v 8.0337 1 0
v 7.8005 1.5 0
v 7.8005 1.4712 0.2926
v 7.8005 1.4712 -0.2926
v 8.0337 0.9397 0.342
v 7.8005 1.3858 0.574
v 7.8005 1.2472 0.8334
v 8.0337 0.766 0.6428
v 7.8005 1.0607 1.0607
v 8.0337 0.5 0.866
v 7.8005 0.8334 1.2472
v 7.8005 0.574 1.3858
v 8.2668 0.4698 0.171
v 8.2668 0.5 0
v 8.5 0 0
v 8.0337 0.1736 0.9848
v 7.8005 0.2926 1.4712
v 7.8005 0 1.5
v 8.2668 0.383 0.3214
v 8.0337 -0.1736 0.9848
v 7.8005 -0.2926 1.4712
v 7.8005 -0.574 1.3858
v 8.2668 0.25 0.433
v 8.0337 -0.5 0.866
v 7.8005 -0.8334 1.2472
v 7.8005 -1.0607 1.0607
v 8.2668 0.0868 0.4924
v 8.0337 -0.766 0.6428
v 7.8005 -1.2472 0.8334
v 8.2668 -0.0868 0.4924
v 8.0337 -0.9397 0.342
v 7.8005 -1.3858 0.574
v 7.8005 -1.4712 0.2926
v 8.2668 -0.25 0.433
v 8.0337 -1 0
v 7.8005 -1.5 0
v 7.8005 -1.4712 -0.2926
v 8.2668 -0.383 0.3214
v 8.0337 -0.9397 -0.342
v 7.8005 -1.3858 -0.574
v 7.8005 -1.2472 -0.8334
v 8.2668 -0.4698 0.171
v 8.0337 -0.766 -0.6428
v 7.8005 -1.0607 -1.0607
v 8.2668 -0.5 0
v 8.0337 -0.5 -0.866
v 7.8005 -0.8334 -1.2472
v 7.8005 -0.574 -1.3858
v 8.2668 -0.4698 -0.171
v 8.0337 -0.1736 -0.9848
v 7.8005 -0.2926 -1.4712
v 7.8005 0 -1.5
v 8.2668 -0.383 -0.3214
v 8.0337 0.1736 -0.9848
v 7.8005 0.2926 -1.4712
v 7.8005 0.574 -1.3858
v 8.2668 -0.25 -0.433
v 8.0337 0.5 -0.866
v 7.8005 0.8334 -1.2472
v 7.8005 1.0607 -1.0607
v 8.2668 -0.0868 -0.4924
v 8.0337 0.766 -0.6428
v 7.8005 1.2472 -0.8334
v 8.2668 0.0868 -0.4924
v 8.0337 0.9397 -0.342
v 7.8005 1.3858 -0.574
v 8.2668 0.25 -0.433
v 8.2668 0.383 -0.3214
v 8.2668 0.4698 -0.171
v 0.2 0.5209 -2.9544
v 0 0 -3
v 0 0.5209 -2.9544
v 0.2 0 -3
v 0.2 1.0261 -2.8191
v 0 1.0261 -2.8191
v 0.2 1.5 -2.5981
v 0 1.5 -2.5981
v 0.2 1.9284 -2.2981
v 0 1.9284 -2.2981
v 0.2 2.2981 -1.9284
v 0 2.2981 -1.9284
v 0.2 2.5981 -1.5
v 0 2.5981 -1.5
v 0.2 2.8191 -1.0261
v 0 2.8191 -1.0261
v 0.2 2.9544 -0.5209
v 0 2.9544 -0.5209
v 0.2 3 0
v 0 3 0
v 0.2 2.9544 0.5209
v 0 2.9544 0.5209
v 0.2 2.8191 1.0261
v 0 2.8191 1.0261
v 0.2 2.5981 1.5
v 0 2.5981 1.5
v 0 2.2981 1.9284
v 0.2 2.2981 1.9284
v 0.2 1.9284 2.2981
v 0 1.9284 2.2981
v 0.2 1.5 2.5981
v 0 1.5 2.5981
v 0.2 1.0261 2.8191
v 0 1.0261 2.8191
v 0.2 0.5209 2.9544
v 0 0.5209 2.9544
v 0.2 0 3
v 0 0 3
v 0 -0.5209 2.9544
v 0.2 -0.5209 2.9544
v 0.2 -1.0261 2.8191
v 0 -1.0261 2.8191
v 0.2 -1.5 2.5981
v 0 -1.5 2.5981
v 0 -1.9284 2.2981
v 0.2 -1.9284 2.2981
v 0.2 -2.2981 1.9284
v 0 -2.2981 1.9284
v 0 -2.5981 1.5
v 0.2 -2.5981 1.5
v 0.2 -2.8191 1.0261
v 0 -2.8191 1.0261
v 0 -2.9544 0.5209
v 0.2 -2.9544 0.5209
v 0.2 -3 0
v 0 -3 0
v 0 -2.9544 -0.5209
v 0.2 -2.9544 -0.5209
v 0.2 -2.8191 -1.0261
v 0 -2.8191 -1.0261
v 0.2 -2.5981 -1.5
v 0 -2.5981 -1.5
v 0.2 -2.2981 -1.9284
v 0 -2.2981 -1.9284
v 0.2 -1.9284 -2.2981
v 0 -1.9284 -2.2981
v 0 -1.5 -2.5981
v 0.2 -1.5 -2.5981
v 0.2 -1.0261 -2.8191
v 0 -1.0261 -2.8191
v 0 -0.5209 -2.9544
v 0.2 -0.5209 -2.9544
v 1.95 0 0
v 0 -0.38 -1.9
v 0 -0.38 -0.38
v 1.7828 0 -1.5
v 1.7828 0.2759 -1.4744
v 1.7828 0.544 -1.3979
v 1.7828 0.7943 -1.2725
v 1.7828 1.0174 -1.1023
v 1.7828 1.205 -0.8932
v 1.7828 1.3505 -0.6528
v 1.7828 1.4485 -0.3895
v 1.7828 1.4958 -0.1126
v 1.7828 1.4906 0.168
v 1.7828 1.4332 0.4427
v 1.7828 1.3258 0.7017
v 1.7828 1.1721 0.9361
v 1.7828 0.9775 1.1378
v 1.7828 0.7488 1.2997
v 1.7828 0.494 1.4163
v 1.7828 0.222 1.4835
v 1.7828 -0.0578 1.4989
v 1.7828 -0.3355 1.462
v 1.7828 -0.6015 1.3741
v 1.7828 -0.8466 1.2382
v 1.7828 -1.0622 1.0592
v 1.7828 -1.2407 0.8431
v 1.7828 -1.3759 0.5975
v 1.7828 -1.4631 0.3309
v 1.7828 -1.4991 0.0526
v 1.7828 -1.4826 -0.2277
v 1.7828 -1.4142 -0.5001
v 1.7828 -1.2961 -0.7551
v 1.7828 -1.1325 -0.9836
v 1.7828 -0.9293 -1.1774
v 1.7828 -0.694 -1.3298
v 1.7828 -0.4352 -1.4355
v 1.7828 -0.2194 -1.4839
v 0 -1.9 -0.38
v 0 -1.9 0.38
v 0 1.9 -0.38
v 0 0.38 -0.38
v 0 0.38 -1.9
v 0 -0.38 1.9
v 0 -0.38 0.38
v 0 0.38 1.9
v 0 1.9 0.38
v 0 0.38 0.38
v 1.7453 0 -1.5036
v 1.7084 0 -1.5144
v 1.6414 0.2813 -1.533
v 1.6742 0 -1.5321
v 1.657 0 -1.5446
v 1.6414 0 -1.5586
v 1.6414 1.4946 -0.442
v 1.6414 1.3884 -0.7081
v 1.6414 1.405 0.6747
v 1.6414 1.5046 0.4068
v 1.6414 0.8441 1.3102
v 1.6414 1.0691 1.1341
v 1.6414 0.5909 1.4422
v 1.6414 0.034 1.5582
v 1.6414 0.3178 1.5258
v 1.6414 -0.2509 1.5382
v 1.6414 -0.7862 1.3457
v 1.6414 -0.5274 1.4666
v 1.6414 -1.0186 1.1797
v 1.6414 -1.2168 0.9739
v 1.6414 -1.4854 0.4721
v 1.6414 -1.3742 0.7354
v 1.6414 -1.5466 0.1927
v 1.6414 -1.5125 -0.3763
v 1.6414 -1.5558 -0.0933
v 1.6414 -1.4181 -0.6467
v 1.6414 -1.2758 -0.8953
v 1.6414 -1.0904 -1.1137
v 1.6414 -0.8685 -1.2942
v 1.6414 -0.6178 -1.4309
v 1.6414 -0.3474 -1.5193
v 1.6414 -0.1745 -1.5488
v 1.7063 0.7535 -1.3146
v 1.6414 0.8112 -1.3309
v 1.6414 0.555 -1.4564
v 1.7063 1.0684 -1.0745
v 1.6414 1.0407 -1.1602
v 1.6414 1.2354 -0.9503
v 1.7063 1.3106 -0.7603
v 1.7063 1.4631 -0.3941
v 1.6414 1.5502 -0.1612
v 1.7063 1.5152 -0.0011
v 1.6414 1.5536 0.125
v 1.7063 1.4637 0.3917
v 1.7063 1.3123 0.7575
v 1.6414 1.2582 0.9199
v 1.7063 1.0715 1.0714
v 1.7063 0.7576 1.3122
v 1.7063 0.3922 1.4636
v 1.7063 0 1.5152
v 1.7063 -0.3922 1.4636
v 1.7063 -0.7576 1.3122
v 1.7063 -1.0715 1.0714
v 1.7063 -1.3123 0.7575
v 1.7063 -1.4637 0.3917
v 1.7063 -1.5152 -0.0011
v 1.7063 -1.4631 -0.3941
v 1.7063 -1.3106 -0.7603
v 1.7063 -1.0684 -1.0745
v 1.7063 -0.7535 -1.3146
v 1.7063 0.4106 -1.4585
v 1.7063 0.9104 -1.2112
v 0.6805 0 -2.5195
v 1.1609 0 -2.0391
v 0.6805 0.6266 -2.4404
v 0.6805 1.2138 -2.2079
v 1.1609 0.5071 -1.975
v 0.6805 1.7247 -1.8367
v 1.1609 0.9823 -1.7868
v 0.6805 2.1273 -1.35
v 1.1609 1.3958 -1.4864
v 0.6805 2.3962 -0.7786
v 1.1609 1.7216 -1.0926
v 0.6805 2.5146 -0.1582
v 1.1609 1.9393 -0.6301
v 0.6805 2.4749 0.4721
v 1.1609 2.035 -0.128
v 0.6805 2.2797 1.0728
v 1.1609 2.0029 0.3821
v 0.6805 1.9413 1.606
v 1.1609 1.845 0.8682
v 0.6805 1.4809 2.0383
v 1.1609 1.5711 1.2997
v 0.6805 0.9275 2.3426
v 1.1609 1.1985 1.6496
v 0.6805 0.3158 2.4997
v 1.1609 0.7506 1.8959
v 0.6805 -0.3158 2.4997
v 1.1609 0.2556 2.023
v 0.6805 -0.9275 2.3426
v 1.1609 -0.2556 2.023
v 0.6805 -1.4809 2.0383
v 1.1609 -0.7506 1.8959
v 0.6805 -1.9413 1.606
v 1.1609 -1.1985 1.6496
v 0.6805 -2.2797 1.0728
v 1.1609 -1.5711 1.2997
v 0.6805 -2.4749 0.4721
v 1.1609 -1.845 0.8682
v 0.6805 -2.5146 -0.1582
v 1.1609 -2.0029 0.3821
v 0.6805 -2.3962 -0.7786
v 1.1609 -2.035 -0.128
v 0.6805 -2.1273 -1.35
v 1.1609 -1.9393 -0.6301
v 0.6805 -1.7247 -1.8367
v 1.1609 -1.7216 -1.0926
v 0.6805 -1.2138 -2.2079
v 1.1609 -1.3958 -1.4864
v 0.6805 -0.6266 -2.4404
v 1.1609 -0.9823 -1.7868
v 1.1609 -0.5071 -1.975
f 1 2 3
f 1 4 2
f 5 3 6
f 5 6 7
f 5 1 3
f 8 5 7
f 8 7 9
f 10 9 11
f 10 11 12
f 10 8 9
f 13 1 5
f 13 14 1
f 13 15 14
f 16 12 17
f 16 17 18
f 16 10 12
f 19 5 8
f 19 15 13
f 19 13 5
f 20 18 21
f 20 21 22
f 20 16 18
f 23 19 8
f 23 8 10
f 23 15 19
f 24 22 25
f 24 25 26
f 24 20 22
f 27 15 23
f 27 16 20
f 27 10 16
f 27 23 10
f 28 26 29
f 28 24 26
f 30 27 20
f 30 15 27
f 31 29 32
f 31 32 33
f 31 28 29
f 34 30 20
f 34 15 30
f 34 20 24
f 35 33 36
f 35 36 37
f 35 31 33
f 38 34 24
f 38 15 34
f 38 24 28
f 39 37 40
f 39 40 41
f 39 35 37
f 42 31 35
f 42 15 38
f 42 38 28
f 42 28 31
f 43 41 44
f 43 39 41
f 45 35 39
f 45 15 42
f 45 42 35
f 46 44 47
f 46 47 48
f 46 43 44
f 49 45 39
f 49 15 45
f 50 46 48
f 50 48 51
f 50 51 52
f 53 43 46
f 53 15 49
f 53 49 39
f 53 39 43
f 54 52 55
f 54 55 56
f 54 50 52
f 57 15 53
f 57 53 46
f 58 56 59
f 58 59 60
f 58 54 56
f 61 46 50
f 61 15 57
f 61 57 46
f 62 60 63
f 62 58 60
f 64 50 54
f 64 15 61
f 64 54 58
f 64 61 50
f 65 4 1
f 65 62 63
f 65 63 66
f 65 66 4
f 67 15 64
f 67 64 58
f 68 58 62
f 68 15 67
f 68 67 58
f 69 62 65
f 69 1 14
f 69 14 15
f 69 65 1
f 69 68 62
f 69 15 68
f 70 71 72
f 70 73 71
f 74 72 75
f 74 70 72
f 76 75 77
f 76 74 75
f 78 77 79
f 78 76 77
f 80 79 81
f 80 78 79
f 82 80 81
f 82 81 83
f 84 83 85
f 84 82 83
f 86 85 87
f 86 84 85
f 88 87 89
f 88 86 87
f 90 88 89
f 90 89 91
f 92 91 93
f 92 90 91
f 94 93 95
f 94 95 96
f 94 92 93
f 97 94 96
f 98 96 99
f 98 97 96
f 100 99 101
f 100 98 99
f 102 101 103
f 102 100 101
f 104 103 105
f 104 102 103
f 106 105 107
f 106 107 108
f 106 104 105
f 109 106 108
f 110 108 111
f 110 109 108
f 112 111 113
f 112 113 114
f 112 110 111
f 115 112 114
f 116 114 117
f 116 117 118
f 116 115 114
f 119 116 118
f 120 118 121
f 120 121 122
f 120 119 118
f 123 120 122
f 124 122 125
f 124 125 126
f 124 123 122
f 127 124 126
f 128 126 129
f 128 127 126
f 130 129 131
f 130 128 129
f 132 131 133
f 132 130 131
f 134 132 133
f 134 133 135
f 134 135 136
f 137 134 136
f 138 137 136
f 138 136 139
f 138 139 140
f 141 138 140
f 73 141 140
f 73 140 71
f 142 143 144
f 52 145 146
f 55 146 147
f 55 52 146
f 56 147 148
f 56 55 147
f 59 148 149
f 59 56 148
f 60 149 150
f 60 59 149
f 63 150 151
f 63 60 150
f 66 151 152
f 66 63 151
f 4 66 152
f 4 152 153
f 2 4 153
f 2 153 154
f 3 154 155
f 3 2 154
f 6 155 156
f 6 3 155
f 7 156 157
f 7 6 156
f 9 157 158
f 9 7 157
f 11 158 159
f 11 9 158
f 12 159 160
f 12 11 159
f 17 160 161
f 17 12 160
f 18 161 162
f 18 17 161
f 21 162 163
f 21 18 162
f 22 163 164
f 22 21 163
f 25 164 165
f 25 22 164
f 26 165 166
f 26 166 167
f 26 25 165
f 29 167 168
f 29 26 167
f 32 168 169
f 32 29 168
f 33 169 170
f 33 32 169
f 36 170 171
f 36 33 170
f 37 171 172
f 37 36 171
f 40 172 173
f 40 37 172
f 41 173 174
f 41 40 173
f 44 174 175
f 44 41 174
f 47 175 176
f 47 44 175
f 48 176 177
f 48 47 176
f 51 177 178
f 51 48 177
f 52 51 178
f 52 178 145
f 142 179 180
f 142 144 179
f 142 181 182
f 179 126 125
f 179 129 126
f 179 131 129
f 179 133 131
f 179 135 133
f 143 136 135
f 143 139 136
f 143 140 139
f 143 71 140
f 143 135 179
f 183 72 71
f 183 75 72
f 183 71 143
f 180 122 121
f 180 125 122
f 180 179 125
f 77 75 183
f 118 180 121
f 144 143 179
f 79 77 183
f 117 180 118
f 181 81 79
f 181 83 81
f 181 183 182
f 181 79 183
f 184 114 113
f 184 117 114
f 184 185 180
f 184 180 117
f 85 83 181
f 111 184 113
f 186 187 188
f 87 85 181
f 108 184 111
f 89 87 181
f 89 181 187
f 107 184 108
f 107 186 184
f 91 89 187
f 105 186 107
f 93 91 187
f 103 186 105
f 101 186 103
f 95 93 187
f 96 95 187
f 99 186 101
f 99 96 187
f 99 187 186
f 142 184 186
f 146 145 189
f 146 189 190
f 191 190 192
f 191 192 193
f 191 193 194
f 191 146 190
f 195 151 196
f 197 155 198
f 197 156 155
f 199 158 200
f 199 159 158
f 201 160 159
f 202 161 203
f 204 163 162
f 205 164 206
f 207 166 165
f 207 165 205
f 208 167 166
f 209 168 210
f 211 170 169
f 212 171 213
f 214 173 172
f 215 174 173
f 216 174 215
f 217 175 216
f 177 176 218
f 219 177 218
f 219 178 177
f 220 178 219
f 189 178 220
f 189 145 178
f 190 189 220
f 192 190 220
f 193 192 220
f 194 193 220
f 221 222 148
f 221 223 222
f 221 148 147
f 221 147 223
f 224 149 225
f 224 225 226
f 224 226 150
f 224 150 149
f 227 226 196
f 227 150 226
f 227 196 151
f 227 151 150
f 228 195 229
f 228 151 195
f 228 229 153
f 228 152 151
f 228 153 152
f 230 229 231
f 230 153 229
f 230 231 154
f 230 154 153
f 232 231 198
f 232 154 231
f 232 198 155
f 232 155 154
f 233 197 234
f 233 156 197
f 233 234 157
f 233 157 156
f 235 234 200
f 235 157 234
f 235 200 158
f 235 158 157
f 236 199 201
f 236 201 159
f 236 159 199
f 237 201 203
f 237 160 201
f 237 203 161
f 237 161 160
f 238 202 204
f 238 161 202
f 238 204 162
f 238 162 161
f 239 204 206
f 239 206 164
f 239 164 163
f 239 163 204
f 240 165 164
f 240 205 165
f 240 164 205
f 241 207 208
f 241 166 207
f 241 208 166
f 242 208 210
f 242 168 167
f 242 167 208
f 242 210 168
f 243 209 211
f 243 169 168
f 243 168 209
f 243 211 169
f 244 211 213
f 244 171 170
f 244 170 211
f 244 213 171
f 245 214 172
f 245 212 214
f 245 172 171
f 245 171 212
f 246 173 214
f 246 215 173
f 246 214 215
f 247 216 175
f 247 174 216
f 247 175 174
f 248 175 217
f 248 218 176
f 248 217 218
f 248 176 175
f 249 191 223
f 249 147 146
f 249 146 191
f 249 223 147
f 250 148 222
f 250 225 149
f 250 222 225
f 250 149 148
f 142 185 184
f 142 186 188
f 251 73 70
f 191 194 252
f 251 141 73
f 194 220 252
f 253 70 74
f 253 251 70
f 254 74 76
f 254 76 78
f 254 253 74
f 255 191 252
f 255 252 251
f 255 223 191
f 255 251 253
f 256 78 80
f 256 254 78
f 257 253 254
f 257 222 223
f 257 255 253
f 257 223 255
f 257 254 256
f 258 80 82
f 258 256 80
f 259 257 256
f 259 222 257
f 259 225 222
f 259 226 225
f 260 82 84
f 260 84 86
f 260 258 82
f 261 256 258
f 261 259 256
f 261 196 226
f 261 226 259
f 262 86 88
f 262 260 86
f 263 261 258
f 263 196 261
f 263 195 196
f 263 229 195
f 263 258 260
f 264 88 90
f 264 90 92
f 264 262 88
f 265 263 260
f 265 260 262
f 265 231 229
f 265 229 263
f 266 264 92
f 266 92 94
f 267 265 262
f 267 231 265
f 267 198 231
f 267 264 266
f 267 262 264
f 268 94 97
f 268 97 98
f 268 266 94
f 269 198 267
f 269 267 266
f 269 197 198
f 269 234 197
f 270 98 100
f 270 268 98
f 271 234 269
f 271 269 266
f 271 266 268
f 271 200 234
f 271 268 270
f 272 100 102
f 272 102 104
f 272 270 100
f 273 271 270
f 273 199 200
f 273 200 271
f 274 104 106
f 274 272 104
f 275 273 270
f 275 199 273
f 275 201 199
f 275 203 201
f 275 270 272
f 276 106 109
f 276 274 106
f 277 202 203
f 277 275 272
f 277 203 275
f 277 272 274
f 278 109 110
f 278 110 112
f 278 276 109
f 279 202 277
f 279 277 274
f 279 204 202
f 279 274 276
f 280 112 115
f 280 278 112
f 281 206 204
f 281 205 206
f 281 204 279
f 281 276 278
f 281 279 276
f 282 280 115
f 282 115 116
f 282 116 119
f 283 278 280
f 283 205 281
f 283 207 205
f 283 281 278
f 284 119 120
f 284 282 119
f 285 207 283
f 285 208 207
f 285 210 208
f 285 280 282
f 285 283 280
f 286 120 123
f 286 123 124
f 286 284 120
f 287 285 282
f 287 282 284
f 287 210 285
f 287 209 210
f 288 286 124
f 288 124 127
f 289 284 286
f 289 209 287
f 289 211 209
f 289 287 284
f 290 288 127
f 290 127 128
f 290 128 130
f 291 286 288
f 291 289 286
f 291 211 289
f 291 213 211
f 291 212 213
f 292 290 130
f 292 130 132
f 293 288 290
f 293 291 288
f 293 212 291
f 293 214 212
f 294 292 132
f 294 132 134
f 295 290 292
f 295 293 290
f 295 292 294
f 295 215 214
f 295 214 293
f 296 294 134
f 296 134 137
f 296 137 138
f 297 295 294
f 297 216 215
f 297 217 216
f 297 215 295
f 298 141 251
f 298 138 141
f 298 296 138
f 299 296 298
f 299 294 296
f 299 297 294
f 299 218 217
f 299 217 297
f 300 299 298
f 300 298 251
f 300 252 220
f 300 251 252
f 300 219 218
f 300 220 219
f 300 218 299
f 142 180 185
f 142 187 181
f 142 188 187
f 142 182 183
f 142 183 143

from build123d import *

# Parameters (mm, degrees)
FILLET2_R = 0.2


with BuildPart() as part:
    # Sketch1 → Base (revolve)
    with BuildSketch(Plane(origin=(0, 0, 0), x_dir=(1, 0, 0), z_dir=(0, 1, 0))):
        Polygon((1.7, 1.5), (8.5, 1.5), (8.5, 0), (0, 0), (0, 3), (0.2, 3), align=None)
    revolve(axis=Axis((-6.506452013, 0, 0), (1, 0, 0)))

    # Sketch3 → Cut-Revolve1 (revolve, cut)
    with BuildSketch(Plane.XY):
        Polygon((8.65755877, 0), (8.65755877, 20), (-0.826153163, 20), (8.5, 0), align=None)
    revolve(axis=Axis((4.883468835, 0, 0), (1, 0, 0)), mode=Mode.SUBTRACT)

    # Fillet2
    fillet2_edges = [part.edges().sort_by_distance(p)[0] for p in [
        (1.7, 0, 1.5),
    ]]
    fillet(fillet2_edges, radius=FILLET2_R)

    # Sketch2 → Cut-Loft1 section 0
    with BuildSketch(Plane(origin=(0, -0.680816871, 0.306758275), x_dir=(0, 0, 1), z_dir=(-1, 0, 0)), mode=Mode.PRIVATE) as cut_loft1_s0:
        Polygon((-0.686758275, 1.060816871), (-2.206758275, 1.060816871), (-2.206758275, 0.300816871), (-0.686758275, 0.300816871), (-0.686758275, -1.219183129), (0.073241725, -1.219183129), (0.073241725, 0.300816871), (1.593241725, 0.300816871), (1.593241725, 1.060816871), (0.073241725, 1.060816871), (0.073241725, 2.580816871), (-0.686758275, 2.580816871), align=None)
    loft([cut_loft1_s0.sketch, Vertex(1.95, 0, 0)], mode=Mode.SUBTRACT)


solid = part.part
